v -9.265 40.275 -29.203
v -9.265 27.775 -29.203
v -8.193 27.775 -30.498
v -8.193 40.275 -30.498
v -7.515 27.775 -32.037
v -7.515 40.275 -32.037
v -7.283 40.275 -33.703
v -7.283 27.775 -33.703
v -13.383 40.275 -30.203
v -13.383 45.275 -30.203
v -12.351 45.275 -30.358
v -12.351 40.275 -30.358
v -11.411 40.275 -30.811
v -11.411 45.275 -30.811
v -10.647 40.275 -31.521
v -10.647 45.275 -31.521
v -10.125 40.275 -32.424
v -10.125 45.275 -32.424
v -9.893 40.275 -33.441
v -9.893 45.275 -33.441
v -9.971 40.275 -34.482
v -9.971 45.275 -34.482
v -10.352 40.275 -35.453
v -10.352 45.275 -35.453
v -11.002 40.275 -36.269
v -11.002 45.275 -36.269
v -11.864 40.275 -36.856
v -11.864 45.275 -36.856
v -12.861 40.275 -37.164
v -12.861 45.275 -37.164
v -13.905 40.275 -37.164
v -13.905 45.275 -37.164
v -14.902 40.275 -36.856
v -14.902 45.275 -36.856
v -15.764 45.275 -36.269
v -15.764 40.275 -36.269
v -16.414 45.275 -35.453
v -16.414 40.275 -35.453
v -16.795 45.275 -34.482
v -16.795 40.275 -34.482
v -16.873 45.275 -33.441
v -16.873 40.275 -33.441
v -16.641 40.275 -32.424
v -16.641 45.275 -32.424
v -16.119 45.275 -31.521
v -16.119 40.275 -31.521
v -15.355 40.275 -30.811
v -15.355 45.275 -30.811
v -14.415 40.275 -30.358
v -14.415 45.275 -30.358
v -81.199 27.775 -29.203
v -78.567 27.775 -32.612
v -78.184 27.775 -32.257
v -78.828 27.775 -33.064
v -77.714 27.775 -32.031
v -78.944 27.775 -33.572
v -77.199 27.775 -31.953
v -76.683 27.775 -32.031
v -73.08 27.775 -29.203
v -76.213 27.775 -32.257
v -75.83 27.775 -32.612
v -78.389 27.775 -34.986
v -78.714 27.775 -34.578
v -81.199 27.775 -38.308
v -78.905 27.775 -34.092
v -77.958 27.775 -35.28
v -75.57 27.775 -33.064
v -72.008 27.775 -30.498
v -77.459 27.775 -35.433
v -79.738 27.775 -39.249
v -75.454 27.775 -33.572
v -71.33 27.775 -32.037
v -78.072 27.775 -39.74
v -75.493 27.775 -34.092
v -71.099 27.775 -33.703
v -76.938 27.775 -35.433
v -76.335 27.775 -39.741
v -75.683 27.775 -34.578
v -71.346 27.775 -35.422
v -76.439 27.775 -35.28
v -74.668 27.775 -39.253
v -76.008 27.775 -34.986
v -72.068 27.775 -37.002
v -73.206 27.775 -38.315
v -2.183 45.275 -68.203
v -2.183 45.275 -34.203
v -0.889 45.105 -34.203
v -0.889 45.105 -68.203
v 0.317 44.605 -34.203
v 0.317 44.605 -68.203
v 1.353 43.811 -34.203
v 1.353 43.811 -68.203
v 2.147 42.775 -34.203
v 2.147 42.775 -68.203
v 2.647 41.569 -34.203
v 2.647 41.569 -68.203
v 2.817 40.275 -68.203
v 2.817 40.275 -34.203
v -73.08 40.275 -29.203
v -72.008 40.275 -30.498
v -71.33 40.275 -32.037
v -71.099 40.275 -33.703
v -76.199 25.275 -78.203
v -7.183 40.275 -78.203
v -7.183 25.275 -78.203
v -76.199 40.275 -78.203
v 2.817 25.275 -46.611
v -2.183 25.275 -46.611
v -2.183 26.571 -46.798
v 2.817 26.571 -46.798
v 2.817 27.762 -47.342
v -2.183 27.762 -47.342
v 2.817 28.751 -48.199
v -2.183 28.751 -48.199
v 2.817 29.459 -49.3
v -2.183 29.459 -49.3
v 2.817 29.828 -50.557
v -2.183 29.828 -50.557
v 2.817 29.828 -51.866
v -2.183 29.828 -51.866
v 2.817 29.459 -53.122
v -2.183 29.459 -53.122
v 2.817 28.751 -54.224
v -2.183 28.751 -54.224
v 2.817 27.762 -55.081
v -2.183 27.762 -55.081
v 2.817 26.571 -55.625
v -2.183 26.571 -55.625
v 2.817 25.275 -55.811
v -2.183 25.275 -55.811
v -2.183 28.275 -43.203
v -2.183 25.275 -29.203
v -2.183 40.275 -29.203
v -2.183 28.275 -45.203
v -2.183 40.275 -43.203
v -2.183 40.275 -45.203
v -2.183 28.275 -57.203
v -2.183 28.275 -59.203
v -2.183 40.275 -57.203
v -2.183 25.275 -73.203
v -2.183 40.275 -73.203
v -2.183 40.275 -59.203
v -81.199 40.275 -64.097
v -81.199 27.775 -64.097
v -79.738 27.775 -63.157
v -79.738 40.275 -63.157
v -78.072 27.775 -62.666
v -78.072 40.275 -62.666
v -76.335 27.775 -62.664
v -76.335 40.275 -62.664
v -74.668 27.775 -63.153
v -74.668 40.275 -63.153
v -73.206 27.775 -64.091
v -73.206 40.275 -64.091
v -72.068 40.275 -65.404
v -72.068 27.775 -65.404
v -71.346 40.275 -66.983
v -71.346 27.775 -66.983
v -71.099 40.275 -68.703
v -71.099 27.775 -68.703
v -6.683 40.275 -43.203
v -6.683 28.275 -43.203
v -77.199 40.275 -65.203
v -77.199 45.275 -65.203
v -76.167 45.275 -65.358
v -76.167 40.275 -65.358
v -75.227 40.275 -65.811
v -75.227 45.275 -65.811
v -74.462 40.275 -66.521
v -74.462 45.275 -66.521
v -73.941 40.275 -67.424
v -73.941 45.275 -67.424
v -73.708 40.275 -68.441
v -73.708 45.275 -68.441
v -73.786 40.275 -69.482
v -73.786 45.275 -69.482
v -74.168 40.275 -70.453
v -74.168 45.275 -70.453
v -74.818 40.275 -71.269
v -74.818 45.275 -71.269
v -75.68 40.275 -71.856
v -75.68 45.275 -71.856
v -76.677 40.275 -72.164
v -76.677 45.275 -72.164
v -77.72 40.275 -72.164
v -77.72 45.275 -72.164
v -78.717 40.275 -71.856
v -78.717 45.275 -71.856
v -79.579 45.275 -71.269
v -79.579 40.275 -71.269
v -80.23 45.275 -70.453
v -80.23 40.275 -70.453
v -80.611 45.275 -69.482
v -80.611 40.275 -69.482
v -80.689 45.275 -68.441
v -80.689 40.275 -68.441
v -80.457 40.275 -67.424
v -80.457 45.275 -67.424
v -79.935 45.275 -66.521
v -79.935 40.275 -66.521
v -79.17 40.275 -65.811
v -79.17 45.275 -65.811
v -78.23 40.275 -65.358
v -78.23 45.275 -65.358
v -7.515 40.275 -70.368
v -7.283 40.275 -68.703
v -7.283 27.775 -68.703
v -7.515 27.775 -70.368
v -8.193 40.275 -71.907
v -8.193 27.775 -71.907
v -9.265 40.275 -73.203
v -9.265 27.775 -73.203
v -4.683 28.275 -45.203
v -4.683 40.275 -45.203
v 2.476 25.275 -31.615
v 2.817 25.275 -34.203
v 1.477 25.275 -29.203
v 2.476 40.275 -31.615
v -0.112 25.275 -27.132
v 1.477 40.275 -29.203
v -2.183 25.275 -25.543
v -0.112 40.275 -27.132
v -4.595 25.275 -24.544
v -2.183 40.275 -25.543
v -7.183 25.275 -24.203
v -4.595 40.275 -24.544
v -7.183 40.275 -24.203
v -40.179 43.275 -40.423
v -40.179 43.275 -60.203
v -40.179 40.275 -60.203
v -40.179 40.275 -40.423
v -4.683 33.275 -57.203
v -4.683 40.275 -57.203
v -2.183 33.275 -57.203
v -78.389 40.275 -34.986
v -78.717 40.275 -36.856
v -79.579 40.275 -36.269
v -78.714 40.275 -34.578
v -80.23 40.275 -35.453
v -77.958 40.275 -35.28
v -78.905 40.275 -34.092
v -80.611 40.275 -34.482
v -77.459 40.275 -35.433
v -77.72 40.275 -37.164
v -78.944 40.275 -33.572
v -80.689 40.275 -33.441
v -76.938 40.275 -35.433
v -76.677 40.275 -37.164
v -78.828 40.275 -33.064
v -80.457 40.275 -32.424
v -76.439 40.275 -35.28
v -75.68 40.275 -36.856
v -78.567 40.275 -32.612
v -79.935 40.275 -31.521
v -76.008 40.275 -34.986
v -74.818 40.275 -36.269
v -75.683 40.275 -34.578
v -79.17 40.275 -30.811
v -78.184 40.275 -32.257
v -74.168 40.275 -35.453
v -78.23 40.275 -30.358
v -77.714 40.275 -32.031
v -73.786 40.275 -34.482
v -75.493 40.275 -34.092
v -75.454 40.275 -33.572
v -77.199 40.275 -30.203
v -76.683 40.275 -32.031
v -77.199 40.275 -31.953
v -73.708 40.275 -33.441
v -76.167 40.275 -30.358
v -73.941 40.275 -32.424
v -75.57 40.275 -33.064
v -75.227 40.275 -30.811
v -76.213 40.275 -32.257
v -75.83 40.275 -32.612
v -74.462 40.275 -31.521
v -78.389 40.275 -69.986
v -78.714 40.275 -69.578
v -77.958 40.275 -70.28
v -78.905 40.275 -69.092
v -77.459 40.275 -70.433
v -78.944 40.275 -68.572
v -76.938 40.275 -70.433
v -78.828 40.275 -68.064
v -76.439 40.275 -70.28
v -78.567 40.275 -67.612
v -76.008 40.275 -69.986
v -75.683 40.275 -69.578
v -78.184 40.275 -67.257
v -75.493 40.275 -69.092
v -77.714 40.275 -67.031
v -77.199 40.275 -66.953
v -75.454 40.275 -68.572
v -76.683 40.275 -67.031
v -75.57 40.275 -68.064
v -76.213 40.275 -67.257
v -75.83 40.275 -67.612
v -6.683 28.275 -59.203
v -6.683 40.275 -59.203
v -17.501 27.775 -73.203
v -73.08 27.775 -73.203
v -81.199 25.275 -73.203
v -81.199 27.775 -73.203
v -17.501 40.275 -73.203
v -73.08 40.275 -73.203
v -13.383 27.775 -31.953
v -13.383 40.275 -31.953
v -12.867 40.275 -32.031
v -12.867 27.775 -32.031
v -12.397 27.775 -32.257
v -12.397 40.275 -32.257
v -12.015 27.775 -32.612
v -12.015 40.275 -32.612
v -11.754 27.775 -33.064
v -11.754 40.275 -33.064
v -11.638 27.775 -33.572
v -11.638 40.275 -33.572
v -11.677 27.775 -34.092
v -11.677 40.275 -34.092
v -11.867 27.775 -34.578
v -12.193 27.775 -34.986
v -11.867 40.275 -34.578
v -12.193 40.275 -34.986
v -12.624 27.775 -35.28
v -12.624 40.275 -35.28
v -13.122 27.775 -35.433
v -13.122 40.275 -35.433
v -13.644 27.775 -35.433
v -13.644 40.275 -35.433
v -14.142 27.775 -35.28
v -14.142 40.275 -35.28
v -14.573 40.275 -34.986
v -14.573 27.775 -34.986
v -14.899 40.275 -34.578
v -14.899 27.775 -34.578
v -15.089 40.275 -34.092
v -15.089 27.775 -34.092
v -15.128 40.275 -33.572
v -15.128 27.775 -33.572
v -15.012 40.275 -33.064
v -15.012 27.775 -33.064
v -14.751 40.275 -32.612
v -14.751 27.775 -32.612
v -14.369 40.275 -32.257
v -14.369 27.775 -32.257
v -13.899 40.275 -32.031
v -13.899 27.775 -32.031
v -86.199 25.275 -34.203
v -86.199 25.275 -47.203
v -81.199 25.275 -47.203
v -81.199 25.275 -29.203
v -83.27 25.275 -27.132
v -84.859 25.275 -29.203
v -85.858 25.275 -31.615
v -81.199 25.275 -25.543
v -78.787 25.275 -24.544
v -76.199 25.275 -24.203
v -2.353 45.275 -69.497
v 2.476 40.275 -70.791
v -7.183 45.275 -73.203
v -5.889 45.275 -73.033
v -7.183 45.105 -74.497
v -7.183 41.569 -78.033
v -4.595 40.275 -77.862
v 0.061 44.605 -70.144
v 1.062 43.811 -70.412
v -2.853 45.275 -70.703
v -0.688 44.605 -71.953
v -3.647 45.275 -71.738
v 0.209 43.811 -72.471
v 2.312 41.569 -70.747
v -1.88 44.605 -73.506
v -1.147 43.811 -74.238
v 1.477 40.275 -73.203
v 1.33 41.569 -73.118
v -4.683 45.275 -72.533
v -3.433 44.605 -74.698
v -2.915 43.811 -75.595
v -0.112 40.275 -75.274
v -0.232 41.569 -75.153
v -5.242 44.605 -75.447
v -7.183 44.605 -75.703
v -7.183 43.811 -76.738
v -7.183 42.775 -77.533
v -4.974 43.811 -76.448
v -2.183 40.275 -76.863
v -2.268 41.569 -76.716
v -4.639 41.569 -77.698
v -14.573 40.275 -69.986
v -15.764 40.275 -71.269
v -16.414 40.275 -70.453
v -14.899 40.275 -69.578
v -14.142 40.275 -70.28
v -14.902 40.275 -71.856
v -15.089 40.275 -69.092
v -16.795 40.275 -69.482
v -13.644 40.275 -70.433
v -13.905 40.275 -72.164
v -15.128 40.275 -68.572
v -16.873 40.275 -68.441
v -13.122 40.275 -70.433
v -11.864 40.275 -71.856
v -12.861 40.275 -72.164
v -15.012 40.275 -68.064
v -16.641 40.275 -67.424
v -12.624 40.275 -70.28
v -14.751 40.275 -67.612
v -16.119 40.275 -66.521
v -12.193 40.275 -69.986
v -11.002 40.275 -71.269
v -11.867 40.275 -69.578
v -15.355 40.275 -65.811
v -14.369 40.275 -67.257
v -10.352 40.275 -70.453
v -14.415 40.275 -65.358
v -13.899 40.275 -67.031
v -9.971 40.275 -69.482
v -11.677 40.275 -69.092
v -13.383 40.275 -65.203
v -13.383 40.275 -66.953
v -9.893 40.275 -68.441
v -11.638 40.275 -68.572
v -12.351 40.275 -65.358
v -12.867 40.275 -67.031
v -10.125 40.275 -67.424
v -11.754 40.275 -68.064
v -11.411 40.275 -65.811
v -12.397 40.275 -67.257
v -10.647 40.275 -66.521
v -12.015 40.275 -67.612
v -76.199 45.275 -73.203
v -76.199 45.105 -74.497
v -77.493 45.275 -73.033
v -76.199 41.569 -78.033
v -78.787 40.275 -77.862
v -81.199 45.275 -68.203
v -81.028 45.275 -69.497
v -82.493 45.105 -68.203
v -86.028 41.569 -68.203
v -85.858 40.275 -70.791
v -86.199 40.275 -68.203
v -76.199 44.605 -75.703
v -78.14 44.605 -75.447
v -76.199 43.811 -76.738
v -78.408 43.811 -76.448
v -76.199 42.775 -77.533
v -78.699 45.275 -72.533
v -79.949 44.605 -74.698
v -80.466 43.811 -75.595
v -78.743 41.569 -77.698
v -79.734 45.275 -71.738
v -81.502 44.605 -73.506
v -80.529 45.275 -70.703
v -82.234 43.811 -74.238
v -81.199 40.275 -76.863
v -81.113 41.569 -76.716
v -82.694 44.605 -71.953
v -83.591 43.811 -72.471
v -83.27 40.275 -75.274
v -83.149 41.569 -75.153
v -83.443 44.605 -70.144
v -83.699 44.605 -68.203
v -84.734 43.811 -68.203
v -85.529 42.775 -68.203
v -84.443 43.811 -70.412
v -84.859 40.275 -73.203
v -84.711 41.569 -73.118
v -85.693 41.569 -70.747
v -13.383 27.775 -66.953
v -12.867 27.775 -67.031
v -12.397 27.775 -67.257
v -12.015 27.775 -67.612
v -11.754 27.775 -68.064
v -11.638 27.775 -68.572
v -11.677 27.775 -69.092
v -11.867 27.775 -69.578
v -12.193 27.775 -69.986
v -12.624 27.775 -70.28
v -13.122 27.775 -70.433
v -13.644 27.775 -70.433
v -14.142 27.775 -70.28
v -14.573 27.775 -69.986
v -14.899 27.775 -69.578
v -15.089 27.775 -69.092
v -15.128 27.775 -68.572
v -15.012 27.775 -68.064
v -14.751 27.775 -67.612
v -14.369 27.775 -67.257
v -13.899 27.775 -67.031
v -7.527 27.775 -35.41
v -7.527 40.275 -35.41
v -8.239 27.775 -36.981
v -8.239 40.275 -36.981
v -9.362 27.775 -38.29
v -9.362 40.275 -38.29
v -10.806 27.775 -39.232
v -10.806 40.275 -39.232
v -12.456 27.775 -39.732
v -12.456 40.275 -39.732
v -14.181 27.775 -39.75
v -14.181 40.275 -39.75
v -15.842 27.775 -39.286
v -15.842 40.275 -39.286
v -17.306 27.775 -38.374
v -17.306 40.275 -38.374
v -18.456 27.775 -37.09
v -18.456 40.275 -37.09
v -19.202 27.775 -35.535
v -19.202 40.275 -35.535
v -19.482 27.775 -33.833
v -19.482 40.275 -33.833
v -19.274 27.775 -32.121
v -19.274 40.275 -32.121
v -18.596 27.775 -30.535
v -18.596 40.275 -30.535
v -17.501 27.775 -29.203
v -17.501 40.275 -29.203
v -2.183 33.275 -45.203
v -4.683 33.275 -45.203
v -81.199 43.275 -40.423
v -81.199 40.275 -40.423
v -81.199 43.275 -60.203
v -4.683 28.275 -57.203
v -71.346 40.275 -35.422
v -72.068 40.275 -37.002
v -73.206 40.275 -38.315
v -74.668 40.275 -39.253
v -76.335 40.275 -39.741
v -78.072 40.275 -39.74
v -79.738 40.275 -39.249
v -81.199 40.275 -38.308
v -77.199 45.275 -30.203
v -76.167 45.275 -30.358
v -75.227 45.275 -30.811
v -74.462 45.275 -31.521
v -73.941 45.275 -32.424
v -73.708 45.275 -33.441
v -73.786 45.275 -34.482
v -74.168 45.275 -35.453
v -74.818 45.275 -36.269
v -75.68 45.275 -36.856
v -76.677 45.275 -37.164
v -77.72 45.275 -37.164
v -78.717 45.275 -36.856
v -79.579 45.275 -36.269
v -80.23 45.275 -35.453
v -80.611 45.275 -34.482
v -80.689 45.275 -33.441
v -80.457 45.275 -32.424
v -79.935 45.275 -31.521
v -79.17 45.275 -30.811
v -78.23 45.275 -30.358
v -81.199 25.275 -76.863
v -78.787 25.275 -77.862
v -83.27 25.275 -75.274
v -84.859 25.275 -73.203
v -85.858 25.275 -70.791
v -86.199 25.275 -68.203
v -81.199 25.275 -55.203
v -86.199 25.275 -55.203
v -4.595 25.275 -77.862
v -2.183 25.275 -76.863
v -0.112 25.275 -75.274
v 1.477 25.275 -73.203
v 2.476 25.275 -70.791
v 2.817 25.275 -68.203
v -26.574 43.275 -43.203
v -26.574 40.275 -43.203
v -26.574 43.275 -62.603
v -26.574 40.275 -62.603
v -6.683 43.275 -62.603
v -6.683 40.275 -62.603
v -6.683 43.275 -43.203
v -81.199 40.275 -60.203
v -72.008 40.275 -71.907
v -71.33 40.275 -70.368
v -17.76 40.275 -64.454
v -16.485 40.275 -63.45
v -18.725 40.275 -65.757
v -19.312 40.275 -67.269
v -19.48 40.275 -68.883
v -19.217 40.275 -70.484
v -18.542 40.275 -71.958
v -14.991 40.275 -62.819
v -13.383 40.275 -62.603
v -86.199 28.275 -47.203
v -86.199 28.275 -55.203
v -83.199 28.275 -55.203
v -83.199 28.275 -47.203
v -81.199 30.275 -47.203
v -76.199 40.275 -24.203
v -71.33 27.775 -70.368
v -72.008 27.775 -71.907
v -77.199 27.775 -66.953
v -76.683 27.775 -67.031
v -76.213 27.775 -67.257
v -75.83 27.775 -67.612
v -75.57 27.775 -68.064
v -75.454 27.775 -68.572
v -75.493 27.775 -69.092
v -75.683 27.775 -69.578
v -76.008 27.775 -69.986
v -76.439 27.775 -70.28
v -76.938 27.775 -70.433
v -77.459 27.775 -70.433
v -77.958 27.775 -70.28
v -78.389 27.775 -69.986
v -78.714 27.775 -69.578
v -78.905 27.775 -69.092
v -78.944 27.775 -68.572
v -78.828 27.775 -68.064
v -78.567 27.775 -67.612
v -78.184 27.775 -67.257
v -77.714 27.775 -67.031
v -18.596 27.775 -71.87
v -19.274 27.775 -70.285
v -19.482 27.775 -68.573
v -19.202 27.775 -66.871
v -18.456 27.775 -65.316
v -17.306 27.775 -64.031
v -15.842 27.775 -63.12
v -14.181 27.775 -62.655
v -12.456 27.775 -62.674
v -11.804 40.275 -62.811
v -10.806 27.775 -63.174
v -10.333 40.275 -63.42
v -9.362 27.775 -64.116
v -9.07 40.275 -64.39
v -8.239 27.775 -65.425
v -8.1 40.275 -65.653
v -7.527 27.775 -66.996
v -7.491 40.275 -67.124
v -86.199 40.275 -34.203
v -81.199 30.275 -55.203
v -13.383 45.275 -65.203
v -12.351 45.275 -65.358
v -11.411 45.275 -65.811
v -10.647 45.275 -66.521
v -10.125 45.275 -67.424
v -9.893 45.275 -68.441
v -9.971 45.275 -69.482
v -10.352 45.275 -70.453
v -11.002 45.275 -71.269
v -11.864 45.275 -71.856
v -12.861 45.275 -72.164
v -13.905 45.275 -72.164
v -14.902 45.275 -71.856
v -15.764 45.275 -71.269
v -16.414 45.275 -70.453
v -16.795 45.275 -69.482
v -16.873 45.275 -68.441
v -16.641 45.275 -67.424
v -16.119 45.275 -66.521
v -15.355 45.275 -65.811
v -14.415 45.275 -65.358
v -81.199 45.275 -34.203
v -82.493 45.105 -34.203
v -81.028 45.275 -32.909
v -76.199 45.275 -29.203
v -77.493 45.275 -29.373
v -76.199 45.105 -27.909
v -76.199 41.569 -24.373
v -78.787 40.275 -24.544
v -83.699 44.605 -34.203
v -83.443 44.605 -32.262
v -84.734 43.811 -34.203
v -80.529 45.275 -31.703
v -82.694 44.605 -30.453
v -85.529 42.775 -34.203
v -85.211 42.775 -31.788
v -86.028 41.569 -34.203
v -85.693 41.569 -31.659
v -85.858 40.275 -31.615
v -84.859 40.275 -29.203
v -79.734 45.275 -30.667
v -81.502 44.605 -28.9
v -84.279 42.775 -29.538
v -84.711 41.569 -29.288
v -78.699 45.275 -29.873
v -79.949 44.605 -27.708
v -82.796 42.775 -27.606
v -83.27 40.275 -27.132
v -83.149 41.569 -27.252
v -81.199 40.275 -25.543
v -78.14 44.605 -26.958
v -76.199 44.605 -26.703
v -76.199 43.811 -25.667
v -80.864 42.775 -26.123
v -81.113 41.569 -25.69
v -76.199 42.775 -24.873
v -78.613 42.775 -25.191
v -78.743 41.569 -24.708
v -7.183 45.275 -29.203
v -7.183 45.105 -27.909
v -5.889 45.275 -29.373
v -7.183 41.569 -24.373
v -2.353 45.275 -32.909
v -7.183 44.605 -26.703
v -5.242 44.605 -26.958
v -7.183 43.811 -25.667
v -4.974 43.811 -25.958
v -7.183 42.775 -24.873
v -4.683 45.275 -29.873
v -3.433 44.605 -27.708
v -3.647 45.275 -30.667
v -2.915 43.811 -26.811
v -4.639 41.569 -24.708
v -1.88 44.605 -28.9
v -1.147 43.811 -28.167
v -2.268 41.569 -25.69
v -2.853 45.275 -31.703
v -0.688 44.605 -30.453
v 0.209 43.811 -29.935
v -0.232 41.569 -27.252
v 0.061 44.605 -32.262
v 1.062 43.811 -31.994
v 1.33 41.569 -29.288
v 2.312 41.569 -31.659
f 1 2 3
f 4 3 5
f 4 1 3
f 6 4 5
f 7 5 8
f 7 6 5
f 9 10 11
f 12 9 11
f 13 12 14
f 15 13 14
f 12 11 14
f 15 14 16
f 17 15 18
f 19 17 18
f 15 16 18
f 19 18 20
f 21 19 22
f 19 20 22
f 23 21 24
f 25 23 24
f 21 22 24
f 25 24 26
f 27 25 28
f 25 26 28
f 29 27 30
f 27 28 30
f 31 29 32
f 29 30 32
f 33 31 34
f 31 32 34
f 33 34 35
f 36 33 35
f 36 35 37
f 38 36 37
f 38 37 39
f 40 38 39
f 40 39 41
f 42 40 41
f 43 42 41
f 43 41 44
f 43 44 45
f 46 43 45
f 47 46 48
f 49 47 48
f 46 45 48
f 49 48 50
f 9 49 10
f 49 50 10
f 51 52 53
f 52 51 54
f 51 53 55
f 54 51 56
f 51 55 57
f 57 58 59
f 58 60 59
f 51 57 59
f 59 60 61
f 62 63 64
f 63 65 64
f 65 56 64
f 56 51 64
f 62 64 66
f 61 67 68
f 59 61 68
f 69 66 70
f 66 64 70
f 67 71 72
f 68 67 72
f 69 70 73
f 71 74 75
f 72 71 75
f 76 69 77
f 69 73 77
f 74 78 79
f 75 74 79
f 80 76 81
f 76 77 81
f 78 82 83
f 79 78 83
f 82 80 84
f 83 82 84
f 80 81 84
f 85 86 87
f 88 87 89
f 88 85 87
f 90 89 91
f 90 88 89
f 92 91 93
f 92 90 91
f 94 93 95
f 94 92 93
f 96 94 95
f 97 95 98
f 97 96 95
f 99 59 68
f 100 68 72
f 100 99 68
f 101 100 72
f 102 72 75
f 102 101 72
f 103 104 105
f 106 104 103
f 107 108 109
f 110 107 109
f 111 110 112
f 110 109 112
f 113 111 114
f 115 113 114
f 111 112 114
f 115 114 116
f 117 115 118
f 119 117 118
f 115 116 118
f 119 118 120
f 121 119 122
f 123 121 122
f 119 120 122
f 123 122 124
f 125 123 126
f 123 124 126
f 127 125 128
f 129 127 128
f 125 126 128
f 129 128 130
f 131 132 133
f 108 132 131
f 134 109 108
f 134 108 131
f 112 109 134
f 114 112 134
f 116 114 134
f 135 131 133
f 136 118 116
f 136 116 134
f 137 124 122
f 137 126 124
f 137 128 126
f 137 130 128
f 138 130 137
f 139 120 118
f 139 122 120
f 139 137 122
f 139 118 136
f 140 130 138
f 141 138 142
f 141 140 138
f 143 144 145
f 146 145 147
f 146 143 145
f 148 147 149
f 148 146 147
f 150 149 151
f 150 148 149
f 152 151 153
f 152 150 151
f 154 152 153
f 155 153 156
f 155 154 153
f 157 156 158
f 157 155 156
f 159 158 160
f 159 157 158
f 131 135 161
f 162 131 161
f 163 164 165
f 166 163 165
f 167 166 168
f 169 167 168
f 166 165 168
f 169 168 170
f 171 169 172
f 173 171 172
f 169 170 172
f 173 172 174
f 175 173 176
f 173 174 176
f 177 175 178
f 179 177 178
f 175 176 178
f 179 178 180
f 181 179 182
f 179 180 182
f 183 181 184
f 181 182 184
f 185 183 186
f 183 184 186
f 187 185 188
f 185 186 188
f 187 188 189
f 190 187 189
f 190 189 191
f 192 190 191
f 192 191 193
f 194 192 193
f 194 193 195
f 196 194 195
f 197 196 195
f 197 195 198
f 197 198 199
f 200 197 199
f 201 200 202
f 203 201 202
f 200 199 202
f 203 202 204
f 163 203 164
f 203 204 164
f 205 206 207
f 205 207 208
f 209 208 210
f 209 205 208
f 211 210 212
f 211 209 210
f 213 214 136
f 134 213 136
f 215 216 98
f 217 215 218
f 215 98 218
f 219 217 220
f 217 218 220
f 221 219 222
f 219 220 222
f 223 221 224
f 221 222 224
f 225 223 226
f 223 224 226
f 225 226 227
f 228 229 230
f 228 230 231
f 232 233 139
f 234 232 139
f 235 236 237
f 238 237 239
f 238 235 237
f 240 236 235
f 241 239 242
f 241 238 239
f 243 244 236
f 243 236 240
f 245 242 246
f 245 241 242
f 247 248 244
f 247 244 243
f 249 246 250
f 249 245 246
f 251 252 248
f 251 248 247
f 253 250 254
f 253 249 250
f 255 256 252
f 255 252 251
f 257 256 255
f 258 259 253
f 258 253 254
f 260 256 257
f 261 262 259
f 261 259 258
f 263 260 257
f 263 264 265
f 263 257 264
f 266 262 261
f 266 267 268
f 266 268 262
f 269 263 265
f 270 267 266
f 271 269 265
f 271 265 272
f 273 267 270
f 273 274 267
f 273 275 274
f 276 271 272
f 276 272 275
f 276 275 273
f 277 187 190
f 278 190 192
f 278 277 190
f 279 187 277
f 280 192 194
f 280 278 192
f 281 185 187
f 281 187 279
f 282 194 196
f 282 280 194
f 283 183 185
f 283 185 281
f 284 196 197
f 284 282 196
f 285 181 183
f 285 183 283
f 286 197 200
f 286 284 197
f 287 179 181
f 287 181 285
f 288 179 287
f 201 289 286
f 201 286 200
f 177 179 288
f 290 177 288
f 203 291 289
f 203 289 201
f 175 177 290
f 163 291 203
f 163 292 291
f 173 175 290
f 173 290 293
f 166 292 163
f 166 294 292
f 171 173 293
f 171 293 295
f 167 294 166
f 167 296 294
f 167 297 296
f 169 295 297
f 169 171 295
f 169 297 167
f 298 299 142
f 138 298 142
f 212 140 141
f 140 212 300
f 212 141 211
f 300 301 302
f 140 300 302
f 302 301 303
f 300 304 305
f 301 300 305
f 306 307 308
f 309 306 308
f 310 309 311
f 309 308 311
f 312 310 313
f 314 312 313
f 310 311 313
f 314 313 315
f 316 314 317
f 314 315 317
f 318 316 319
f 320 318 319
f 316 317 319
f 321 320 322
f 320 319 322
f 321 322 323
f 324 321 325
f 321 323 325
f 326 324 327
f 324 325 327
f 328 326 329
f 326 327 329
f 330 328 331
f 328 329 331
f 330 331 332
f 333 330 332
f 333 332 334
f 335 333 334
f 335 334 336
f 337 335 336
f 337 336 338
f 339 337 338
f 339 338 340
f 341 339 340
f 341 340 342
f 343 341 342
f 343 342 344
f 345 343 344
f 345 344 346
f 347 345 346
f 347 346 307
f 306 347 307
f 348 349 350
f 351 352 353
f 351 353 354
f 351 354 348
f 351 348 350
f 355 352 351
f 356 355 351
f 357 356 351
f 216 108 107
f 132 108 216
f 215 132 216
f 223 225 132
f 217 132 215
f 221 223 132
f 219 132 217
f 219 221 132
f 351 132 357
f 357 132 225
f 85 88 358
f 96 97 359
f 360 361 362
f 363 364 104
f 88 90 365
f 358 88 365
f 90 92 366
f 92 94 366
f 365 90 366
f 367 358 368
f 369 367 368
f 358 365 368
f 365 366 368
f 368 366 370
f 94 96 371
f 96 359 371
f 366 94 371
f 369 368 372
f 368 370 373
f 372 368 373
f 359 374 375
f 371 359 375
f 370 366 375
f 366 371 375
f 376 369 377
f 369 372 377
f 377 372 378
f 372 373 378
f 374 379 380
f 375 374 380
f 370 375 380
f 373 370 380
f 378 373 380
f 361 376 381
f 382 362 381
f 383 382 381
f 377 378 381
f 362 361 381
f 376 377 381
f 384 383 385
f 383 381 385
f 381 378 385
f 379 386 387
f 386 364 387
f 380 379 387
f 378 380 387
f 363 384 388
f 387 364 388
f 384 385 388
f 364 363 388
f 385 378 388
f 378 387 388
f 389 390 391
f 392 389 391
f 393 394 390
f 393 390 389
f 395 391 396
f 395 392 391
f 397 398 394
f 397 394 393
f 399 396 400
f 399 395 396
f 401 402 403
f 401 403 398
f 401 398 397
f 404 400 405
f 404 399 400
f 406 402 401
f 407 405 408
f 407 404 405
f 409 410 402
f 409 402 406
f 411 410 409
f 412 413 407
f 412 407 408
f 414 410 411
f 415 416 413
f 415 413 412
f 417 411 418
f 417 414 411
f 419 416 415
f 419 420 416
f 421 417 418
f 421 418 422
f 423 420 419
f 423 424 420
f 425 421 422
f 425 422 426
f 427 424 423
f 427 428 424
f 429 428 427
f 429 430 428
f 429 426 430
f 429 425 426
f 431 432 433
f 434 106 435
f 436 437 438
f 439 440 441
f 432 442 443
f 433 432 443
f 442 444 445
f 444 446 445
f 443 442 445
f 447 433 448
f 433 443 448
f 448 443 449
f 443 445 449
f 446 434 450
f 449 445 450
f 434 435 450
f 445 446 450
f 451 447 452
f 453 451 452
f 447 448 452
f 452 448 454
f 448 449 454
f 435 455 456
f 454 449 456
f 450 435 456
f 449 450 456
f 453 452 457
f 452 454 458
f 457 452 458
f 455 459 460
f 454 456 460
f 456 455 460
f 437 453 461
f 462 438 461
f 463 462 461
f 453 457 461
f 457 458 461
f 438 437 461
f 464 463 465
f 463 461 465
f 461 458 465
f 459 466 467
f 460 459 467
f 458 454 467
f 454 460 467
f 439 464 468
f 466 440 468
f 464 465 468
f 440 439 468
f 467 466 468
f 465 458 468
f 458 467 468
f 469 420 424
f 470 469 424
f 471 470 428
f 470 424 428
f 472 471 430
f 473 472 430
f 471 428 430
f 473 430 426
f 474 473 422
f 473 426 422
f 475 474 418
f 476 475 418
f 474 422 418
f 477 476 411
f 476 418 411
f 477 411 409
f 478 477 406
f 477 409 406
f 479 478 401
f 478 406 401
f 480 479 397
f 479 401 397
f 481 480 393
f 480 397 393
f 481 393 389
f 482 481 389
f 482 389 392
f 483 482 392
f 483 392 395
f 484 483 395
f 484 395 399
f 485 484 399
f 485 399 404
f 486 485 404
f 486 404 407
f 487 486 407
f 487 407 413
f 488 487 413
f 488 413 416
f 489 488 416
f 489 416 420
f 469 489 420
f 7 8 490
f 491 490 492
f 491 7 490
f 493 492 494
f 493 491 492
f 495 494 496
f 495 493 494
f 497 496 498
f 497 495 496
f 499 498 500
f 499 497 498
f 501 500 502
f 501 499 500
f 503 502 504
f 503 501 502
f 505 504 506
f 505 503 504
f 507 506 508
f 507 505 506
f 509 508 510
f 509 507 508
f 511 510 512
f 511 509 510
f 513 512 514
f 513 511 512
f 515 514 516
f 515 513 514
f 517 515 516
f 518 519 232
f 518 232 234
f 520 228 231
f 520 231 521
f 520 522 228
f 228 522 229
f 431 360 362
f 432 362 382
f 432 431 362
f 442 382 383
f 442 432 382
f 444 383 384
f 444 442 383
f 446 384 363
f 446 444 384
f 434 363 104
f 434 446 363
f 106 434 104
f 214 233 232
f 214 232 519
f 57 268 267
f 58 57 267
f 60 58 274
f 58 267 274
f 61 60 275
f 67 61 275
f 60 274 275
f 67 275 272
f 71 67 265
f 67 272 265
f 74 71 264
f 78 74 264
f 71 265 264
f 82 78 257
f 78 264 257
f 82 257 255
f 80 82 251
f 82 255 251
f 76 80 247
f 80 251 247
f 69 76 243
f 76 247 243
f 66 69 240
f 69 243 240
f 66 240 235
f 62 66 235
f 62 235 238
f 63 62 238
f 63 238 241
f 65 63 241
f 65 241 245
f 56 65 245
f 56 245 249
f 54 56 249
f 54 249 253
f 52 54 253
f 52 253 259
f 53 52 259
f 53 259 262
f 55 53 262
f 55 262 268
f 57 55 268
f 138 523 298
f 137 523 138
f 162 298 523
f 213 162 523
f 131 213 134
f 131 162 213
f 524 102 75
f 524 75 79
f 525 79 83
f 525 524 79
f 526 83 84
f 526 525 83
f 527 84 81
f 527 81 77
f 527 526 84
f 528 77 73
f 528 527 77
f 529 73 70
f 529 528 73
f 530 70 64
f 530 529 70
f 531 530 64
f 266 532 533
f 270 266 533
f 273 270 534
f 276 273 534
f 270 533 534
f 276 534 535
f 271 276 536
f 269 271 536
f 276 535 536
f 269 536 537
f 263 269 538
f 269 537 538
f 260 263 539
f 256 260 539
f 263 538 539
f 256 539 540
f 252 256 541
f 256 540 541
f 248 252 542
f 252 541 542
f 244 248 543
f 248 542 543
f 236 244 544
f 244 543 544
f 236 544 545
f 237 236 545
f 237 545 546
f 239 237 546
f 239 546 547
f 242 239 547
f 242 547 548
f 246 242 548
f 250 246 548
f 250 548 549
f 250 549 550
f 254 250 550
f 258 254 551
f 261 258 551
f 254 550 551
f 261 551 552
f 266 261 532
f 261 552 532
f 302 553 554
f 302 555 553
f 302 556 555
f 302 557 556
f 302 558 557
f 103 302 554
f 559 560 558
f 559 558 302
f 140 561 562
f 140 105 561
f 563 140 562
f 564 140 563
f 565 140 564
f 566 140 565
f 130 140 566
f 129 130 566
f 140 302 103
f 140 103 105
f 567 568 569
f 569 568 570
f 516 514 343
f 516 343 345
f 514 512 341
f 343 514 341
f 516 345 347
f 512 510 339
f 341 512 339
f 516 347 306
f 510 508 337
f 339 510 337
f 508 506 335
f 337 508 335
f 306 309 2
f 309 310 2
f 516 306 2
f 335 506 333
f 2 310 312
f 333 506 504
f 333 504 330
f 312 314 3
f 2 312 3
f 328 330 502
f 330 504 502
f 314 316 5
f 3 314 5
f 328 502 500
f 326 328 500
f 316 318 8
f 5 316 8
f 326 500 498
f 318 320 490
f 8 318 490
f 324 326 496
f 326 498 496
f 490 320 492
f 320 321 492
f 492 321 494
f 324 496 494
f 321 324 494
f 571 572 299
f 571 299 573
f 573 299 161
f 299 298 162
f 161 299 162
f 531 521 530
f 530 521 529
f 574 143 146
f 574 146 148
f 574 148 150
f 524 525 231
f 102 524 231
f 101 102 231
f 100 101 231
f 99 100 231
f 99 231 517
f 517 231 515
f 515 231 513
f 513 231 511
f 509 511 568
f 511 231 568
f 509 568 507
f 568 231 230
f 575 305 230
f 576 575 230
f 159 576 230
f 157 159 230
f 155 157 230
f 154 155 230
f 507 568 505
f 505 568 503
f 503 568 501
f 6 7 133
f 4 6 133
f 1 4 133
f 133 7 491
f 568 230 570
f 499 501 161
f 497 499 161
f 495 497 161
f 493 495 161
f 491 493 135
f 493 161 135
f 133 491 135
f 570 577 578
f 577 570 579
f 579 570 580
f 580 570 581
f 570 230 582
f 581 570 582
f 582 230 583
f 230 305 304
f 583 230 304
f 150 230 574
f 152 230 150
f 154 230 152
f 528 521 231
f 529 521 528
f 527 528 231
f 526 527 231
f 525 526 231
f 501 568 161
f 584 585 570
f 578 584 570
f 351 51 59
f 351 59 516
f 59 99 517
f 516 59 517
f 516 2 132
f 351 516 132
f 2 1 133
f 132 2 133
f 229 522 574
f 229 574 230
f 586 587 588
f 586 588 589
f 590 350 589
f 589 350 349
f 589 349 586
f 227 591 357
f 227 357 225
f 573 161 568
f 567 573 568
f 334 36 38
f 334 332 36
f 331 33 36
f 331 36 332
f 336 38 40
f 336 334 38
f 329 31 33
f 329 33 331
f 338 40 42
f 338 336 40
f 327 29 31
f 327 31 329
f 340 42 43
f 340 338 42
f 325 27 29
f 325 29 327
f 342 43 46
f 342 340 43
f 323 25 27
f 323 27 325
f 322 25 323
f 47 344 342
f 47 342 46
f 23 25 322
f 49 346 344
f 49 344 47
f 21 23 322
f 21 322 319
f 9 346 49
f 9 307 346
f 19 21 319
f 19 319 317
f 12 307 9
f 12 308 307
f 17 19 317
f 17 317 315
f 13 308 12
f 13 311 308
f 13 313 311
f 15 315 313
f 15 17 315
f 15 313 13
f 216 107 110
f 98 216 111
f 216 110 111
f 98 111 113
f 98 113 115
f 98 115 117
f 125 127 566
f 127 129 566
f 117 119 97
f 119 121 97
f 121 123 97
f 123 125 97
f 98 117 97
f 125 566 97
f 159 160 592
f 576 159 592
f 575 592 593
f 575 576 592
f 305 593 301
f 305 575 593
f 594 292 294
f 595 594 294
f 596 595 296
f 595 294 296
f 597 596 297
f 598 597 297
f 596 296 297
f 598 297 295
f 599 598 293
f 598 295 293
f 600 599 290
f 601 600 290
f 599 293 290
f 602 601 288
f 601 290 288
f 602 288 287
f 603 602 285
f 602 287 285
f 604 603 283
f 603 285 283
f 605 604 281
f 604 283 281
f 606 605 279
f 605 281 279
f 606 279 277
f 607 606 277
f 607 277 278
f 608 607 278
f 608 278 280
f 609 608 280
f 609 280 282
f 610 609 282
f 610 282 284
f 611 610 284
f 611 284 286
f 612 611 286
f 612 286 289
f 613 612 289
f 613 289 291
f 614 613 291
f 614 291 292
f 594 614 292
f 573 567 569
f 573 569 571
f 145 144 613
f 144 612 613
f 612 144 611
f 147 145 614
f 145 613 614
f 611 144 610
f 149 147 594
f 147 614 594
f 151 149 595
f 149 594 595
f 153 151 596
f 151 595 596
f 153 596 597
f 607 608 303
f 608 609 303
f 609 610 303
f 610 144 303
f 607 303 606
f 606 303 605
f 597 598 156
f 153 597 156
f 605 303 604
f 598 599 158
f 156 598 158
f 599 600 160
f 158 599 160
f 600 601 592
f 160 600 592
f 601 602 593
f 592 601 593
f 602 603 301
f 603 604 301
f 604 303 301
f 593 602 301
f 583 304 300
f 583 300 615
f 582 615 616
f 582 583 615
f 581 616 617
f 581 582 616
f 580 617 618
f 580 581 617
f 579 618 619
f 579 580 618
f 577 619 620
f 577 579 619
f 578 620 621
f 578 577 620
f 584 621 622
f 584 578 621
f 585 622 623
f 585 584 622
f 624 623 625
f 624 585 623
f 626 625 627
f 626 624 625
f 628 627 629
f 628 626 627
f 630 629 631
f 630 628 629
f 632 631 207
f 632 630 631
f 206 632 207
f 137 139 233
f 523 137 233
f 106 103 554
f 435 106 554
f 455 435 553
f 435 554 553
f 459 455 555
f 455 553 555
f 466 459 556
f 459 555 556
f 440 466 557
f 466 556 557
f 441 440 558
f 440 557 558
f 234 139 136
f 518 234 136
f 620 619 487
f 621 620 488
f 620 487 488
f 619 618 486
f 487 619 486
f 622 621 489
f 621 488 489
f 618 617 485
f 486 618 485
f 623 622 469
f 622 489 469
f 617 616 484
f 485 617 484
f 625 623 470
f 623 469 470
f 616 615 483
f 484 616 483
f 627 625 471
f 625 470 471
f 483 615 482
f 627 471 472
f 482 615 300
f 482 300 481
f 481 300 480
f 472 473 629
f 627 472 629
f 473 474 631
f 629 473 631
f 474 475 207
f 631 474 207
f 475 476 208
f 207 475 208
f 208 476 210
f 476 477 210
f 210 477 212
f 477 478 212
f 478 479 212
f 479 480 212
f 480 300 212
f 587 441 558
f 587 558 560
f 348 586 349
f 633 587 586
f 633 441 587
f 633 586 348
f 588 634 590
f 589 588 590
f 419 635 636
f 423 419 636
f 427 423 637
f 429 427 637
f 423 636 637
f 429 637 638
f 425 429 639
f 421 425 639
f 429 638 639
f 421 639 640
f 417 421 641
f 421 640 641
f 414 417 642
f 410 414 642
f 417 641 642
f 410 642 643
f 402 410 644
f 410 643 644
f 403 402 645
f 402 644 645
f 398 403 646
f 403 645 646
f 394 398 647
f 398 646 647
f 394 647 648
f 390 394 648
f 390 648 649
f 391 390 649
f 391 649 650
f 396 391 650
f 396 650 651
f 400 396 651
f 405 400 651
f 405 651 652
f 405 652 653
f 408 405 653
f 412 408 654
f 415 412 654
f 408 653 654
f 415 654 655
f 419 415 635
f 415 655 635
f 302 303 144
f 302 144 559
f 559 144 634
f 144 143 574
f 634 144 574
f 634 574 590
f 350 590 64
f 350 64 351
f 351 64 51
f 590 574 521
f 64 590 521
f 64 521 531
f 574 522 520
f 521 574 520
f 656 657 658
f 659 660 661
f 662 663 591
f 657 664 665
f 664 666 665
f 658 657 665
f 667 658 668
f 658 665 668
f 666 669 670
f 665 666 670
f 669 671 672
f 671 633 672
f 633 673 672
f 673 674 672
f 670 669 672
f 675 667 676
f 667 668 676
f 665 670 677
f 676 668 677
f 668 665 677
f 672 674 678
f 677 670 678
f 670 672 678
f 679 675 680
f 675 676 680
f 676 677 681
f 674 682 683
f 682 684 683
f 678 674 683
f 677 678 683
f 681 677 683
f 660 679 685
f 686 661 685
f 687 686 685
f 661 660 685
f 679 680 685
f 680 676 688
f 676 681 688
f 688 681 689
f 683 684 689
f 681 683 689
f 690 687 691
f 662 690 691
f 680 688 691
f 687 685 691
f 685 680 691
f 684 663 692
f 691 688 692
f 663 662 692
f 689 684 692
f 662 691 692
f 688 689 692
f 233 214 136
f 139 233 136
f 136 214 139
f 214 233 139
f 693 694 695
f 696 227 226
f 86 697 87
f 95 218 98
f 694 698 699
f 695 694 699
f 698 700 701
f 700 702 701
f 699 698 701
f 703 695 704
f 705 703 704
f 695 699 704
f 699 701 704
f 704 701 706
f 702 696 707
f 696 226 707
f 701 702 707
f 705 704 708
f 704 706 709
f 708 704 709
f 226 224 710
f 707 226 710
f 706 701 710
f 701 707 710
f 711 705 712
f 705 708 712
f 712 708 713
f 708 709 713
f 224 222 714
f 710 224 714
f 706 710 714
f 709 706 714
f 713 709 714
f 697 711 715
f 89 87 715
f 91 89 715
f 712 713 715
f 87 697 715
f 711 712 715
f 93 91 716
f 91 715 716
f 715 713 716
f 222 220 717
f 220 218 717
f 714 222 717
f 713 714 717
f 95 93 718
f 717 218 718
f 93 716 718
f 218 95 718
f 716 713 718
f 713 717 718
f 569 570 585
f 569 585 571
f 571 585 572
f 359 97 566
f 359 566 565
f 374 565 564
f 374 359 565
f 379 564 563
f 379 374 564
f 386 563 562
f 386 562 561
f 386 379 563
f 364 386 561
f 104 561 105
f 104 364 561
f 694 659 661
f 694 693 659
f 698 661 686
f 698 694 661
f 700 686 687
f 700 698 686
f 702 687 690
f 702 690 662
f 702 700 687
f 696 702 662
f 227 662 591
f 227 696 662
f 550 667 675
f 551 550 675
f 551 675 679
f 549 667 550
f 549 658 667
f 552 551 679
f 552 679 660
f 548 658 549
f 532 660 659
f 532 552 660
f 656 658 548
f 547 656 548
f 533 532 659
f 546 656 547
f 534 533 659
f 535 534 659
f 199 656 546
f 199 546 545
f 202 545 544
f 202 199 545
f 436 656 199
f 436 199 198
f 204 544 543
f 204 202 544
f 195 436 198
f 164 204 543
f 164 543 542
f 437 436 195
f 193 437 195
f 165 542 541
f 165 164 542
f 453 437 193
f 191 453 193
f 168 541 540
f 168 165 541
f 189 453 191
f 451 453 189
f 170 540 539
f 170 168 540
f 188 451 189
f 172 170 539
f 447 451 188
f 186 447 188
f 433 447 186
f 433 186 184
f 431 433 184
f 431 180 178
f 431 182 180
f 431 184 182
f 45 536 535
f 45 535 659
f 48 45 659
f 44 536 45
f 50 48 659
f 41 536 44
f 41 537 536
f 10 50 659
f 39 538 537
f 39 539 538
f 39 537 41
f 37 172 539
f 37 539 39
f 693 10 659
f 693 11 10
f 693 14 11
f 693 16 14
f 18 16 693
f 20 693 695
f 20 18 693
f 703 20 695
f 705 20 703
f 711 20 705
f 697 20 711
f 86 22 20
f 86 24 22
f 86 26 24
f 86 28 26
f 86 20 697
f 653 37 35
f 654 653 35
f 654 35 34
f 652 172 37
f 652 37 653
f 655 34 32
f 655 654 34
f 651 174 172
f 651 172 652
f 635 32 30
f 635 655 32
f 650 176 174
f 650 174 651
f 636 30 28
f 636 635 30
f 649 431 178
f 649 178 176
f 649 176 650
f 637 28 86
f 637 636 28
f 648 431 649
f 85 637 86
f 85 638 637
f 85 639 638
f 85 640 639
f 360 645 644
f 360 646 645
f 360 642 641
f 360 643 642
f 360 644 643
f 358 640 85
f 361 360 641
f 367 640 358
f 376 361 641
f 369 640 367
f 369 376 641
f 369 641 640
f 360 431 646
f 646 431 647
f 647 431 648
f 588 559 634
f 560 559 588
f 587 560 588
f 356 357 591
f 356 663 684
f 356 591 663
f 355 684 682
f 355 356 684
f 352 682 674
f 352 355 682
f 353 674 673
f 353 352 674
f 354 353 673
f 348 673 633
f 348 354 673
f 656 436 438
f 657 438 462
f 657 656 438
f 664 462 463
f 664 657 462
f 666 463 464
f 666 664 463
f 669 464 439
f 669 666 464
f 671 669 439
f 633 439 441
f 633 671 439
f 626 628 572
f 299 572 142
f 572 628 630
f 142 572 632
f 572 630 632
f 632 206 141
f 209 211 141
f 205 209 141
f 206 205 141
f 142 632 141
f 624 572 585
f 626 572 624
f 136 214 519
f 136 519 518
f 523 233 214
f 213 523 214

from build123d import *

# Parameters (mm, degrees)
BOSS_EXTRUDE1_DEPTH  = 5
SKETCH3_W            = 89.015633911
SKETCH3_H            = 54
SKETCH3_R            = 1.75
BOSS_EXTRUDE2_DEPTH  = 10
SKETCH4_W            = 5
SKETCH4_H            = 20
SKETCH4_W_2          = 84.015633911
BOSS_EXTRUDE3_DEPTH  = 5
SKETCH5_W            = 84.015633911
SKETCH5_H            = 20
SKETCH5_W_2          = 5
BOSS_EXTRUDE4_DEPTH  = 5
SKETCH6_W            = 5
SKETCH6_H            = 20
BOSS_EXTRUDE5_DEPTH  = 5
SKETCH7_W            = 5
SKETCH7_H            = 20
BOSS_EXTRUDE6_DEPTH  = 5
SKETCH8_W            = 5
SKETCH8_H            = 44
BOSS_EXTRUDE7_DEPTH  = 20
SKETCH11_W           = 89.015633911
SKETCH11_H           = 54
CUT_EXTRUDE2_DEPTH   = 10
SKETCH12_R           = 1.75
BOSS_EXTRUDE8_DEPTH  = 17.5
SKETCH15_W           = 8
SKETCH15_H           = 3
CUT_EXTRUDE4_DEPTH   = 10
BOSS_EXTRUDE9_DEPTH  = 5
SKETCH18_W           = 41.02
SKETCH18_H           = 19.78
BOSS_EXTRUDE10_DEPTH = 2
SKETCH19_R           = 3.5
SKETCH19_R_2         = 1.75
CUT_EXTRUDE5_DEPTH   = 5
FILLET1_R            = 10
FILLET2_R            = 5
BOSS_EXTRUDE11_DEPTH = 12
SKETCH21_W           = 2.5
SKETCH21_H           = 12
BOSS_EXTRUDE12_DEPTH = 7
CUT_EXTRUDE6_DEPTH   = 3
CHAMFER1_SIZE        = 2


with BuildPart() as part:
    # Sketch1 → Boss-Extrude1 (new body)
    with BuildSketch(Plane(origin=(-2.183009885, 0, 0), x_dir=(0, 0, -1), z_dir=(1, 0, 0))):
        with BuildLine():
            Line((30.202901291, 42.056855501), (30.202901291, 27.775000784))
            Line((30.202901291, 27.775000784), (30.202901291, 26.275000784))
            Line((30.202901291, 26.275000784), (30.202901291, 25.275000784))
            Line((30.202901291, 25.275000784), (46.611342077, 25.275000784))
            ThreePointArc((46.611342077, 25.275000784), (51.211342077, 29.875000784), (55.811342077, 25.275000784))
            Line((55.811342077, 25.275000784), (72.202901291, 25.275000784))
            Line((72.202901291, 25.275000784), (72.202901291, 26.275000784))
            Line((72.202901291, 26.275000784), (72.202901291, 27.775000784))
            Line((72.202901291, 27.775000784), (72.202901291, 43.275000784))
            Line((72.202901291, 43.275000784), (72.202901291, 45.275000784))
            Line((72.202901291, 45.275000784), (30.202901291, 45.275000784))
            Line((30.202901291, 45.275000784), (30.202901291, 42.056855501))
        make_face()
    extrude(amount=BOSS_EXTRUDE1_DEPTH)

    # Sketch3 → Boss-Extrude2 (add)
    with BuildSketch(Plane(origin=(0, 45.275000784, 0), x_dir=(1, 0, 0), z_dir=(0, 1, 0))):
        with Locations((-41.690826841, 51.202901291)):
            Rectangle(SKETCH3_W, SKETCH3_H)
        with Locations(Location((-77.198643796, 33.702901291, 0), (0, 0, 270))):
            Circle(SKETCH3_R, mode=Mode.SUBTRACT)
        with Locations(Location((-13.383009885, 33.702901291, 0), (0, 0, 270))):
            Circle(SKETCH3_R, mode=Mode.SUBTRACT)
        with Locations(Location((-77.198643796, 68.702901291, 0), (0, 0, 270))):
            Circle(SKETCH3_R, mode=Mode.SUBTRACT)
        with Locations(Location((-13.383009885, 68.702901291, 0), (0, 0, 270))):
            Circle(SKETCH3_R, mode=Mode.SUBTRACT)
    extrude(amount=BOSS_EXTRUDE2_DEPTH)

    # Sketch4 → Boss-Extrude3 (add)
    with BuildSketch(Plane.XY.offset(-24.202901291)):
        with Locations((0.316990115, 35.275000784)):
            Rectangle(SKETCH4_W, SKETCH4_H)
        with Locations((-44.190826841, 35.275000784)):
            Rectangle(SKETCH4_W_2, SKETCH4_H)
    extrude(amount=-BOSS_EXTRUDE3_DEPTH)

    # Sketch5 → Boss-Extrude4 (add)
    with BuildSketch(Plane(origin=(0, 0, -78.202901291), x_dir=(-1, 0, 0), z_dir=(0, 0, -1))):
        with Locations((44.190826841, 35.275000784)):
            Rectangle(SKETCH5_W, SKETCH5_H)
        with Locations((-0.316990115, 35.275000784)):
            Rectangle(SKETCH5_W_2, SKETCH5_H)
    extrude(amount=-BOSS_EXTRUDE4_DEPTH)

    # Sketch6 → Boss-Extrude5 (add)
    with BuildSketch(Plane(origin=(0, 0, -72.202901291), x_dir=(-1, 0, 0), z_dir=(0, 0, -1))):
        with Locations((-0.316990115, 35.275000784)):
            Rectangle(SKETCH6_W, SKETCH6_H)
    extrude(amount=BOSS_EXTRUDE5_DEPTH)

    # Sketch7 → Boss-Extrude6 (add)
    with BuildSketch(Plane.XY.offset(-30.202901291)):
        with Locations((0.316990115, 35.275000784)):
            Rectangle(SKETCH7_W, SKETCH7_H)
    extrude(amount=BOSS_EXTRUDE6_DEPTH)

    # Sketch8 → Boss-Extrude7 (add)
    with BuildSketch(Plane.XZ.offset(-45.275000784)):
        with Locations((-83.698643796, -51.202901291)):
            Rectangle(SKETCH8_W, SKETCH8_H)
    extrude(amount=BOSS_EXTRUDE7_DEPTH)

    # Sketch11 → Cut-Extrude2 (cut)
    with BuildSketch(Plane(origin=(0, 55.275000784, 0), x_dir=(1, 0, 0), z_dir=(0, 1, 0))):
        with Locations((-41.690826841, 51.202901291)):
            Rectangle(SKETCH11_W, SKETCH11_H)
    extrude(amount=-CUT_EXTRUDE2_DEPTH, mode=Mode.SUBTRACT)

    # Sketch12 → Boss-Extrude8 (add)
    # profile 1 of 4: a face of its own
    with BuildSketch(Plane(origin=(0, 45.275000784, 0), x_dir=(1, 0, 0), z_dir=(0, 1, 0))):
        with BuildLine():
            ThreePointArc((-71.098643796, 33.702901291), (-74.667833649, 39.253126511), (-81.198643796, 38.308332867))
            Line((-81.198643796, 38.308332867), (-81.198643796, 29.202901291))
            Line((-81.198643796, 29.202901291), (-73.08039174, 29.202901291))
            ThreePointArc((-73.08039174, 29.202901291), (-71.616021762, 31.244379127), (-71.098643796, 33.702901291))
        make_face()
        with Locations(Location((-77.198643796, 33.702901291, 0), (0, 0, 270))):
            Circle(SKETCH12_R, mode=Mode.SUBTRACT)
    # profile 2 of 4: a face of its own
    with BuildSketch(Plane(origin=(0, 45.275000784, 0), x_dir=(1, 0, 0), z_dir=(0, 1, 0))):
        with BuildLine():
            ThreePointArc((-71.098643796, 68.702901291), (-71.616021762, 71.161423454), (-73.08039174, 73.202901291))
            Line((-73.08039174, 73.202901291), (-81.198643796, 73.202901291))
            Line((-81.198643796, 73.202901291), (-81.198643796, 64.097469715))
            ThreePointArc((-81.198643796, 64.097469715), (-74.667833649, 63.15267607), (-71.098643796, 68.702901291))
        make_face()
        with Locations(Location((-77.198643796, 68.702901291, 0), (0, 0, 270))):
            Circle(SKETCH12_R, mode=Mode.SUBTRACT)
    # profile 3 of 4: a face of its own
    with BuildSketch(Plane(origin=(0, 45.275000784, 0), x_dir=(1, 0, 0), z_dir=(0, 1, 0))):
        with BuildLine():
            ThreePointArc((-7.283009885, 33.702901291), (-15.841532049, 39.285523325), (-17.501261942, 29.202901291))
            Line((-17.501261942, 29.202901291), (-9.264757829, 29.202901291))
            ThreePointArc((-9.264757829, 29.202901291), (-7.800387851, 31.244379127), (-7.283009885, 33.702901291))
        make_face()
        with Locations(Location((-13.383009885, 33.702901291, 0), (0, 0, 270))):
            Circle(SKETCH12_R, mode=Mode.SUBTRACT)
    # profile 4 of 4: a face of its own
    with BuildSketch(Plane(origin=(0, 45.275000784, 0), x_dir=(1, 0, 0), z_dir=(0, 1, 0))):
        with BuildLine():
            ThreePointArc((-17.501261942, 73.202901291), (-15.841532049, 63.120279257), (-7.283009885, 68.702901291))
            ThreePointArc((-7.283009885, 68.702901291), (-7.800387851, 71.161423454), (-9.264757829, 73.202901291))
            Line((-9.264757829, 73.202901291), (-17.501261942, 73.202901291))
        make_face()
        with Locations(Location((-13.383009885, 68.702901291, 0), (0, 0, 270))):
            Circle(SKETCH12_R, mode=Mode.SUBTRACT)
    extrude(amount=-BOSS_EXTRUDE8_DEPTH)

    # Sketch15 → Cut-Extrude4 (cut)
    with BuildSketch(Plane.ZY.offset(86.198643796)):
        with Locations((-51.202901291, 26.775000784)):
            Rectangle(SKETCH15_W, SKETCH15_H)
    extrude(amount=-CUT_EXTRUDE4_DEPTH, mode=Mode.SUBTRACT)

    # Sketch17 → Boss-Extrude9 (add)
    with BuildSketch(Plane(origin=(0, 45.275000784, 0), x_dir=(1, 0, 0), z_dir=(0, 1, 0))):
        with BuildLine():
            Line((-40.178643796, 40.422901291), (-74.198643796, 40.422901291))
            Line((-74.198643796, 40.422901291), (-81.198643796, 40.422901291))
            Line((-81.198643796, 40.422901291), (-81.198643796, 38.308332867))
            ThreePointArc((-81.198643796, 38.308332867), (-72.64554409, 37.762369614), (-73.08039174, 29.202901291))
            Line((-73.08039174, 29.202901291), (-17.501261942, 29.202901291))
            ThreePointArc((-17.501261942, 29.202901291), (-13.383009885, 39.802901291), (-9.264757829, 29.202901291))
            Line((-9.264757829, 29.202901291), (-2.183009885, 29.202901291))
            Line((-2.183009885, 29.202901291), (-2.183009885, 73.202901291))
            Line((-2.183009885, 73.202901291), (-9.264757829, 73.202901291))
            ThreePointArc((-9.264757829, 73.202901291), (-13.383009885, 62.602901291), (-17.501261942, 73.202901291))
            Line((-17.501261942, 73.202901291), (-73.08039174, 73.202901291))
            ThreePointArc((-73.08039174, 73.202901291), (-72.64554409, 64.643432968), (-81.198643796, 64.097469715))
            Line((-81.198643796, 64.097469715), (-81.198643796, 60.202901291))
            Line((-81.198643796, 60.202901291), (-74.198643796, 60.202901291))
            Line((-74.198643796, 60.202901291), (-40.178643796, 60.202901291))
            Line((-40.178643796, 60.202901291), (-40.178643796, 40.422901291))
        make_face()
    extrude(amount=-BOSS_EXTRUDE9_DEPTH)

    # Sketch18 → Boss-Extrude10 (add)
    with BuildSketch(Plane(origin=(0, 45.275000784, 0), x_dir=(1, 0, 0), z_dir=(0, 1, 0))):
        with Locations((-60.688643796, 50.312901291)):
            Rectangle(SKETCH18_W, SKETCH18_H)
    extrude(amount=-BOSS_EXTRUDE10_DEPTH)

    # Sketch19 → Cut-Extrude5 (cut)
    # profile 1 of 4: a face of its own
    with BuildSketch(Plane(origin=(0, 45.275000784, 0), x_dir=(1, 0, 0), z_dir=(0, 1, 0))):
        with Locations(Location((-77.198643796, 68.702901291, 0), (0, 0, 270))):
            Circle(SKETCH19_R)
        with Locations(Location((-77.198643796, 68.702901291, 0), (0, 0, 270))):
            Circle(SKETCH19_R_2, mode=Mode.SUBTRACT)
    # profile 2 of 4: a face of its own
    with BuildSketch(Plane(origin=(0, 45.275000784, 0), x_dir=(1, 0, 0), z_dir=(0, 1, 0))):
        with Locations(Location((-77.198643796, 33.702901291, 0), (0, 0, 270))):
            Circle(SKETCH19_R)
        with Locations(Location((-77.198643796, 33.702901291, 0), (0, 0, 270))):
            Circle(SKETCH19_R_2, mode=Mode.SUBTRACT)
    # profile 3 of 4: a face of its own
    with BuildSketch(Plane(origin=(0, 45.275000784, 0), x_dir=(1, 0, 0), z_dir=(0, 1, 0))):
        with Locations(Location((-13.383009885, 68.702901291, 0), (0, 0, 270))):
            Circle(SKETCH19_R)
        with Locations(Location((-13.383009885, 68.702901291, 0), (0, 0, 270))):
            Circle(SKETCH19_R_2, mode=Mode.SUBTRACT)
    # profile 4 of 4: a face of its own
    with BuildSketch(Plane(origin=(0, 45.275000784, 0), x_dir=(1, 0, 0), z_dir=(0, 1, 0))):
        with Locations(Location((-13.383009885, 33.702901291, 0), (0, 0, 270))):
            Circle(SKETCH19_R)
        with Locations(Location((-13.383009885, 33.702901291, 0), (0, 0, 270))):
            Circle(SKETCH19_R_2, mode=Mode.SUBTRACT)
    extrude(amount=-CUT_EXTRUDE5_DEPTH, mode=Mode.SUBTRACT)

    # Fillet1
    fillet1_edges = [part.edges().sort_by_distance(p)[0] for p in [
        (-86.198643796, 35.275000784, -78.202901291),
        (-86.198643796, 35.275000784, -24.202901291),
        (2.816990115, 35.275000784, -78.202901291),
        (2.816990115, 35.275000784, -24.202901291),
    ]]
    fillet(fillet1_edges, radius=FILLET1_R)

    # Fillet2
    fillet2_edges = [part.edges().sort_by_distance(p)[0] for p in [
        (-41.690826841, 45.275000784, -24.202901291),
        (-86.198643796, 45.275000784, -51.202901291),
        (2.816990115, 45.275000784, -51.202901291),
        (-41.690826841, 45.275000784, -78.202901291),
        (-83.269711608, 45.275000784, -75.273969103),
        (-0.111942073, 45.275000784, -75.273969103),
        (-0.111942073, 45.275000784, -27.131833479),
        (-83.269711608, 45.275000784, -27.131833479),
    ]]
    fillet(fillet2_edges, radius=FILLET2_R)

    # Sketch20 → Boss-Extrude11 (add)
    with BuildSketch(Plane.XZ.offset(-40.275000784)):
        Polygon((-4.683009885, -45.202901291), (-2.183009885, -45.202901291), (-2.183009885, -43.202901291), (-6.683009885, -43.202901291), (-6.683009885, -59.202901291), (-2.183009885, -59.202901291), (-2.183009885, -57.202901291), (-4.683009885, -57.202901291), align=None)
    extrude(amount=BOSS_EXTRUDE11_DEPTH)

    # Sketch22 → Cut-Extrude6 (cut)
    with BuildSketch(Plane.XZ.offset(-40.275000784)):
        Polygon((-13.383009885, -62.602901291), (-6.683009885, -62.602901291), (-6.683009885, -59.202901291), (-6.683009885, -43.202901291), (-26.574347223, -43.202901291), (-26.574347223, -62.602901291), align=None)
    extrude(amount=-CUT_EXTRUDE6_DEPTH, mode=Mode.SUBTRACT)

    # Chamfer1
    chamfer1_edges = [part.edges().sort_by_distance(p)[0] for p in [
        (-81.198643796, 28.275000784, -51.202901291),
    ]]
    chamfer(chamfer1_edges, length=CHAMFER1_SIZE)


with BuildPart() as body_2:
    # Sketch21 → Boss-Extrude12 (new body)
    with BuildSketch(Plane.XZ.offset(-40.275000784)):
        with Locations((-3.433009885, -51.202901291)):
            Rectangle(SKETCH21_W, SKETCH21_H)
    extrude(amount=BOSS_EXTRUDE12_DEPTH)


solid = Compound([part.part, body_2.part])
